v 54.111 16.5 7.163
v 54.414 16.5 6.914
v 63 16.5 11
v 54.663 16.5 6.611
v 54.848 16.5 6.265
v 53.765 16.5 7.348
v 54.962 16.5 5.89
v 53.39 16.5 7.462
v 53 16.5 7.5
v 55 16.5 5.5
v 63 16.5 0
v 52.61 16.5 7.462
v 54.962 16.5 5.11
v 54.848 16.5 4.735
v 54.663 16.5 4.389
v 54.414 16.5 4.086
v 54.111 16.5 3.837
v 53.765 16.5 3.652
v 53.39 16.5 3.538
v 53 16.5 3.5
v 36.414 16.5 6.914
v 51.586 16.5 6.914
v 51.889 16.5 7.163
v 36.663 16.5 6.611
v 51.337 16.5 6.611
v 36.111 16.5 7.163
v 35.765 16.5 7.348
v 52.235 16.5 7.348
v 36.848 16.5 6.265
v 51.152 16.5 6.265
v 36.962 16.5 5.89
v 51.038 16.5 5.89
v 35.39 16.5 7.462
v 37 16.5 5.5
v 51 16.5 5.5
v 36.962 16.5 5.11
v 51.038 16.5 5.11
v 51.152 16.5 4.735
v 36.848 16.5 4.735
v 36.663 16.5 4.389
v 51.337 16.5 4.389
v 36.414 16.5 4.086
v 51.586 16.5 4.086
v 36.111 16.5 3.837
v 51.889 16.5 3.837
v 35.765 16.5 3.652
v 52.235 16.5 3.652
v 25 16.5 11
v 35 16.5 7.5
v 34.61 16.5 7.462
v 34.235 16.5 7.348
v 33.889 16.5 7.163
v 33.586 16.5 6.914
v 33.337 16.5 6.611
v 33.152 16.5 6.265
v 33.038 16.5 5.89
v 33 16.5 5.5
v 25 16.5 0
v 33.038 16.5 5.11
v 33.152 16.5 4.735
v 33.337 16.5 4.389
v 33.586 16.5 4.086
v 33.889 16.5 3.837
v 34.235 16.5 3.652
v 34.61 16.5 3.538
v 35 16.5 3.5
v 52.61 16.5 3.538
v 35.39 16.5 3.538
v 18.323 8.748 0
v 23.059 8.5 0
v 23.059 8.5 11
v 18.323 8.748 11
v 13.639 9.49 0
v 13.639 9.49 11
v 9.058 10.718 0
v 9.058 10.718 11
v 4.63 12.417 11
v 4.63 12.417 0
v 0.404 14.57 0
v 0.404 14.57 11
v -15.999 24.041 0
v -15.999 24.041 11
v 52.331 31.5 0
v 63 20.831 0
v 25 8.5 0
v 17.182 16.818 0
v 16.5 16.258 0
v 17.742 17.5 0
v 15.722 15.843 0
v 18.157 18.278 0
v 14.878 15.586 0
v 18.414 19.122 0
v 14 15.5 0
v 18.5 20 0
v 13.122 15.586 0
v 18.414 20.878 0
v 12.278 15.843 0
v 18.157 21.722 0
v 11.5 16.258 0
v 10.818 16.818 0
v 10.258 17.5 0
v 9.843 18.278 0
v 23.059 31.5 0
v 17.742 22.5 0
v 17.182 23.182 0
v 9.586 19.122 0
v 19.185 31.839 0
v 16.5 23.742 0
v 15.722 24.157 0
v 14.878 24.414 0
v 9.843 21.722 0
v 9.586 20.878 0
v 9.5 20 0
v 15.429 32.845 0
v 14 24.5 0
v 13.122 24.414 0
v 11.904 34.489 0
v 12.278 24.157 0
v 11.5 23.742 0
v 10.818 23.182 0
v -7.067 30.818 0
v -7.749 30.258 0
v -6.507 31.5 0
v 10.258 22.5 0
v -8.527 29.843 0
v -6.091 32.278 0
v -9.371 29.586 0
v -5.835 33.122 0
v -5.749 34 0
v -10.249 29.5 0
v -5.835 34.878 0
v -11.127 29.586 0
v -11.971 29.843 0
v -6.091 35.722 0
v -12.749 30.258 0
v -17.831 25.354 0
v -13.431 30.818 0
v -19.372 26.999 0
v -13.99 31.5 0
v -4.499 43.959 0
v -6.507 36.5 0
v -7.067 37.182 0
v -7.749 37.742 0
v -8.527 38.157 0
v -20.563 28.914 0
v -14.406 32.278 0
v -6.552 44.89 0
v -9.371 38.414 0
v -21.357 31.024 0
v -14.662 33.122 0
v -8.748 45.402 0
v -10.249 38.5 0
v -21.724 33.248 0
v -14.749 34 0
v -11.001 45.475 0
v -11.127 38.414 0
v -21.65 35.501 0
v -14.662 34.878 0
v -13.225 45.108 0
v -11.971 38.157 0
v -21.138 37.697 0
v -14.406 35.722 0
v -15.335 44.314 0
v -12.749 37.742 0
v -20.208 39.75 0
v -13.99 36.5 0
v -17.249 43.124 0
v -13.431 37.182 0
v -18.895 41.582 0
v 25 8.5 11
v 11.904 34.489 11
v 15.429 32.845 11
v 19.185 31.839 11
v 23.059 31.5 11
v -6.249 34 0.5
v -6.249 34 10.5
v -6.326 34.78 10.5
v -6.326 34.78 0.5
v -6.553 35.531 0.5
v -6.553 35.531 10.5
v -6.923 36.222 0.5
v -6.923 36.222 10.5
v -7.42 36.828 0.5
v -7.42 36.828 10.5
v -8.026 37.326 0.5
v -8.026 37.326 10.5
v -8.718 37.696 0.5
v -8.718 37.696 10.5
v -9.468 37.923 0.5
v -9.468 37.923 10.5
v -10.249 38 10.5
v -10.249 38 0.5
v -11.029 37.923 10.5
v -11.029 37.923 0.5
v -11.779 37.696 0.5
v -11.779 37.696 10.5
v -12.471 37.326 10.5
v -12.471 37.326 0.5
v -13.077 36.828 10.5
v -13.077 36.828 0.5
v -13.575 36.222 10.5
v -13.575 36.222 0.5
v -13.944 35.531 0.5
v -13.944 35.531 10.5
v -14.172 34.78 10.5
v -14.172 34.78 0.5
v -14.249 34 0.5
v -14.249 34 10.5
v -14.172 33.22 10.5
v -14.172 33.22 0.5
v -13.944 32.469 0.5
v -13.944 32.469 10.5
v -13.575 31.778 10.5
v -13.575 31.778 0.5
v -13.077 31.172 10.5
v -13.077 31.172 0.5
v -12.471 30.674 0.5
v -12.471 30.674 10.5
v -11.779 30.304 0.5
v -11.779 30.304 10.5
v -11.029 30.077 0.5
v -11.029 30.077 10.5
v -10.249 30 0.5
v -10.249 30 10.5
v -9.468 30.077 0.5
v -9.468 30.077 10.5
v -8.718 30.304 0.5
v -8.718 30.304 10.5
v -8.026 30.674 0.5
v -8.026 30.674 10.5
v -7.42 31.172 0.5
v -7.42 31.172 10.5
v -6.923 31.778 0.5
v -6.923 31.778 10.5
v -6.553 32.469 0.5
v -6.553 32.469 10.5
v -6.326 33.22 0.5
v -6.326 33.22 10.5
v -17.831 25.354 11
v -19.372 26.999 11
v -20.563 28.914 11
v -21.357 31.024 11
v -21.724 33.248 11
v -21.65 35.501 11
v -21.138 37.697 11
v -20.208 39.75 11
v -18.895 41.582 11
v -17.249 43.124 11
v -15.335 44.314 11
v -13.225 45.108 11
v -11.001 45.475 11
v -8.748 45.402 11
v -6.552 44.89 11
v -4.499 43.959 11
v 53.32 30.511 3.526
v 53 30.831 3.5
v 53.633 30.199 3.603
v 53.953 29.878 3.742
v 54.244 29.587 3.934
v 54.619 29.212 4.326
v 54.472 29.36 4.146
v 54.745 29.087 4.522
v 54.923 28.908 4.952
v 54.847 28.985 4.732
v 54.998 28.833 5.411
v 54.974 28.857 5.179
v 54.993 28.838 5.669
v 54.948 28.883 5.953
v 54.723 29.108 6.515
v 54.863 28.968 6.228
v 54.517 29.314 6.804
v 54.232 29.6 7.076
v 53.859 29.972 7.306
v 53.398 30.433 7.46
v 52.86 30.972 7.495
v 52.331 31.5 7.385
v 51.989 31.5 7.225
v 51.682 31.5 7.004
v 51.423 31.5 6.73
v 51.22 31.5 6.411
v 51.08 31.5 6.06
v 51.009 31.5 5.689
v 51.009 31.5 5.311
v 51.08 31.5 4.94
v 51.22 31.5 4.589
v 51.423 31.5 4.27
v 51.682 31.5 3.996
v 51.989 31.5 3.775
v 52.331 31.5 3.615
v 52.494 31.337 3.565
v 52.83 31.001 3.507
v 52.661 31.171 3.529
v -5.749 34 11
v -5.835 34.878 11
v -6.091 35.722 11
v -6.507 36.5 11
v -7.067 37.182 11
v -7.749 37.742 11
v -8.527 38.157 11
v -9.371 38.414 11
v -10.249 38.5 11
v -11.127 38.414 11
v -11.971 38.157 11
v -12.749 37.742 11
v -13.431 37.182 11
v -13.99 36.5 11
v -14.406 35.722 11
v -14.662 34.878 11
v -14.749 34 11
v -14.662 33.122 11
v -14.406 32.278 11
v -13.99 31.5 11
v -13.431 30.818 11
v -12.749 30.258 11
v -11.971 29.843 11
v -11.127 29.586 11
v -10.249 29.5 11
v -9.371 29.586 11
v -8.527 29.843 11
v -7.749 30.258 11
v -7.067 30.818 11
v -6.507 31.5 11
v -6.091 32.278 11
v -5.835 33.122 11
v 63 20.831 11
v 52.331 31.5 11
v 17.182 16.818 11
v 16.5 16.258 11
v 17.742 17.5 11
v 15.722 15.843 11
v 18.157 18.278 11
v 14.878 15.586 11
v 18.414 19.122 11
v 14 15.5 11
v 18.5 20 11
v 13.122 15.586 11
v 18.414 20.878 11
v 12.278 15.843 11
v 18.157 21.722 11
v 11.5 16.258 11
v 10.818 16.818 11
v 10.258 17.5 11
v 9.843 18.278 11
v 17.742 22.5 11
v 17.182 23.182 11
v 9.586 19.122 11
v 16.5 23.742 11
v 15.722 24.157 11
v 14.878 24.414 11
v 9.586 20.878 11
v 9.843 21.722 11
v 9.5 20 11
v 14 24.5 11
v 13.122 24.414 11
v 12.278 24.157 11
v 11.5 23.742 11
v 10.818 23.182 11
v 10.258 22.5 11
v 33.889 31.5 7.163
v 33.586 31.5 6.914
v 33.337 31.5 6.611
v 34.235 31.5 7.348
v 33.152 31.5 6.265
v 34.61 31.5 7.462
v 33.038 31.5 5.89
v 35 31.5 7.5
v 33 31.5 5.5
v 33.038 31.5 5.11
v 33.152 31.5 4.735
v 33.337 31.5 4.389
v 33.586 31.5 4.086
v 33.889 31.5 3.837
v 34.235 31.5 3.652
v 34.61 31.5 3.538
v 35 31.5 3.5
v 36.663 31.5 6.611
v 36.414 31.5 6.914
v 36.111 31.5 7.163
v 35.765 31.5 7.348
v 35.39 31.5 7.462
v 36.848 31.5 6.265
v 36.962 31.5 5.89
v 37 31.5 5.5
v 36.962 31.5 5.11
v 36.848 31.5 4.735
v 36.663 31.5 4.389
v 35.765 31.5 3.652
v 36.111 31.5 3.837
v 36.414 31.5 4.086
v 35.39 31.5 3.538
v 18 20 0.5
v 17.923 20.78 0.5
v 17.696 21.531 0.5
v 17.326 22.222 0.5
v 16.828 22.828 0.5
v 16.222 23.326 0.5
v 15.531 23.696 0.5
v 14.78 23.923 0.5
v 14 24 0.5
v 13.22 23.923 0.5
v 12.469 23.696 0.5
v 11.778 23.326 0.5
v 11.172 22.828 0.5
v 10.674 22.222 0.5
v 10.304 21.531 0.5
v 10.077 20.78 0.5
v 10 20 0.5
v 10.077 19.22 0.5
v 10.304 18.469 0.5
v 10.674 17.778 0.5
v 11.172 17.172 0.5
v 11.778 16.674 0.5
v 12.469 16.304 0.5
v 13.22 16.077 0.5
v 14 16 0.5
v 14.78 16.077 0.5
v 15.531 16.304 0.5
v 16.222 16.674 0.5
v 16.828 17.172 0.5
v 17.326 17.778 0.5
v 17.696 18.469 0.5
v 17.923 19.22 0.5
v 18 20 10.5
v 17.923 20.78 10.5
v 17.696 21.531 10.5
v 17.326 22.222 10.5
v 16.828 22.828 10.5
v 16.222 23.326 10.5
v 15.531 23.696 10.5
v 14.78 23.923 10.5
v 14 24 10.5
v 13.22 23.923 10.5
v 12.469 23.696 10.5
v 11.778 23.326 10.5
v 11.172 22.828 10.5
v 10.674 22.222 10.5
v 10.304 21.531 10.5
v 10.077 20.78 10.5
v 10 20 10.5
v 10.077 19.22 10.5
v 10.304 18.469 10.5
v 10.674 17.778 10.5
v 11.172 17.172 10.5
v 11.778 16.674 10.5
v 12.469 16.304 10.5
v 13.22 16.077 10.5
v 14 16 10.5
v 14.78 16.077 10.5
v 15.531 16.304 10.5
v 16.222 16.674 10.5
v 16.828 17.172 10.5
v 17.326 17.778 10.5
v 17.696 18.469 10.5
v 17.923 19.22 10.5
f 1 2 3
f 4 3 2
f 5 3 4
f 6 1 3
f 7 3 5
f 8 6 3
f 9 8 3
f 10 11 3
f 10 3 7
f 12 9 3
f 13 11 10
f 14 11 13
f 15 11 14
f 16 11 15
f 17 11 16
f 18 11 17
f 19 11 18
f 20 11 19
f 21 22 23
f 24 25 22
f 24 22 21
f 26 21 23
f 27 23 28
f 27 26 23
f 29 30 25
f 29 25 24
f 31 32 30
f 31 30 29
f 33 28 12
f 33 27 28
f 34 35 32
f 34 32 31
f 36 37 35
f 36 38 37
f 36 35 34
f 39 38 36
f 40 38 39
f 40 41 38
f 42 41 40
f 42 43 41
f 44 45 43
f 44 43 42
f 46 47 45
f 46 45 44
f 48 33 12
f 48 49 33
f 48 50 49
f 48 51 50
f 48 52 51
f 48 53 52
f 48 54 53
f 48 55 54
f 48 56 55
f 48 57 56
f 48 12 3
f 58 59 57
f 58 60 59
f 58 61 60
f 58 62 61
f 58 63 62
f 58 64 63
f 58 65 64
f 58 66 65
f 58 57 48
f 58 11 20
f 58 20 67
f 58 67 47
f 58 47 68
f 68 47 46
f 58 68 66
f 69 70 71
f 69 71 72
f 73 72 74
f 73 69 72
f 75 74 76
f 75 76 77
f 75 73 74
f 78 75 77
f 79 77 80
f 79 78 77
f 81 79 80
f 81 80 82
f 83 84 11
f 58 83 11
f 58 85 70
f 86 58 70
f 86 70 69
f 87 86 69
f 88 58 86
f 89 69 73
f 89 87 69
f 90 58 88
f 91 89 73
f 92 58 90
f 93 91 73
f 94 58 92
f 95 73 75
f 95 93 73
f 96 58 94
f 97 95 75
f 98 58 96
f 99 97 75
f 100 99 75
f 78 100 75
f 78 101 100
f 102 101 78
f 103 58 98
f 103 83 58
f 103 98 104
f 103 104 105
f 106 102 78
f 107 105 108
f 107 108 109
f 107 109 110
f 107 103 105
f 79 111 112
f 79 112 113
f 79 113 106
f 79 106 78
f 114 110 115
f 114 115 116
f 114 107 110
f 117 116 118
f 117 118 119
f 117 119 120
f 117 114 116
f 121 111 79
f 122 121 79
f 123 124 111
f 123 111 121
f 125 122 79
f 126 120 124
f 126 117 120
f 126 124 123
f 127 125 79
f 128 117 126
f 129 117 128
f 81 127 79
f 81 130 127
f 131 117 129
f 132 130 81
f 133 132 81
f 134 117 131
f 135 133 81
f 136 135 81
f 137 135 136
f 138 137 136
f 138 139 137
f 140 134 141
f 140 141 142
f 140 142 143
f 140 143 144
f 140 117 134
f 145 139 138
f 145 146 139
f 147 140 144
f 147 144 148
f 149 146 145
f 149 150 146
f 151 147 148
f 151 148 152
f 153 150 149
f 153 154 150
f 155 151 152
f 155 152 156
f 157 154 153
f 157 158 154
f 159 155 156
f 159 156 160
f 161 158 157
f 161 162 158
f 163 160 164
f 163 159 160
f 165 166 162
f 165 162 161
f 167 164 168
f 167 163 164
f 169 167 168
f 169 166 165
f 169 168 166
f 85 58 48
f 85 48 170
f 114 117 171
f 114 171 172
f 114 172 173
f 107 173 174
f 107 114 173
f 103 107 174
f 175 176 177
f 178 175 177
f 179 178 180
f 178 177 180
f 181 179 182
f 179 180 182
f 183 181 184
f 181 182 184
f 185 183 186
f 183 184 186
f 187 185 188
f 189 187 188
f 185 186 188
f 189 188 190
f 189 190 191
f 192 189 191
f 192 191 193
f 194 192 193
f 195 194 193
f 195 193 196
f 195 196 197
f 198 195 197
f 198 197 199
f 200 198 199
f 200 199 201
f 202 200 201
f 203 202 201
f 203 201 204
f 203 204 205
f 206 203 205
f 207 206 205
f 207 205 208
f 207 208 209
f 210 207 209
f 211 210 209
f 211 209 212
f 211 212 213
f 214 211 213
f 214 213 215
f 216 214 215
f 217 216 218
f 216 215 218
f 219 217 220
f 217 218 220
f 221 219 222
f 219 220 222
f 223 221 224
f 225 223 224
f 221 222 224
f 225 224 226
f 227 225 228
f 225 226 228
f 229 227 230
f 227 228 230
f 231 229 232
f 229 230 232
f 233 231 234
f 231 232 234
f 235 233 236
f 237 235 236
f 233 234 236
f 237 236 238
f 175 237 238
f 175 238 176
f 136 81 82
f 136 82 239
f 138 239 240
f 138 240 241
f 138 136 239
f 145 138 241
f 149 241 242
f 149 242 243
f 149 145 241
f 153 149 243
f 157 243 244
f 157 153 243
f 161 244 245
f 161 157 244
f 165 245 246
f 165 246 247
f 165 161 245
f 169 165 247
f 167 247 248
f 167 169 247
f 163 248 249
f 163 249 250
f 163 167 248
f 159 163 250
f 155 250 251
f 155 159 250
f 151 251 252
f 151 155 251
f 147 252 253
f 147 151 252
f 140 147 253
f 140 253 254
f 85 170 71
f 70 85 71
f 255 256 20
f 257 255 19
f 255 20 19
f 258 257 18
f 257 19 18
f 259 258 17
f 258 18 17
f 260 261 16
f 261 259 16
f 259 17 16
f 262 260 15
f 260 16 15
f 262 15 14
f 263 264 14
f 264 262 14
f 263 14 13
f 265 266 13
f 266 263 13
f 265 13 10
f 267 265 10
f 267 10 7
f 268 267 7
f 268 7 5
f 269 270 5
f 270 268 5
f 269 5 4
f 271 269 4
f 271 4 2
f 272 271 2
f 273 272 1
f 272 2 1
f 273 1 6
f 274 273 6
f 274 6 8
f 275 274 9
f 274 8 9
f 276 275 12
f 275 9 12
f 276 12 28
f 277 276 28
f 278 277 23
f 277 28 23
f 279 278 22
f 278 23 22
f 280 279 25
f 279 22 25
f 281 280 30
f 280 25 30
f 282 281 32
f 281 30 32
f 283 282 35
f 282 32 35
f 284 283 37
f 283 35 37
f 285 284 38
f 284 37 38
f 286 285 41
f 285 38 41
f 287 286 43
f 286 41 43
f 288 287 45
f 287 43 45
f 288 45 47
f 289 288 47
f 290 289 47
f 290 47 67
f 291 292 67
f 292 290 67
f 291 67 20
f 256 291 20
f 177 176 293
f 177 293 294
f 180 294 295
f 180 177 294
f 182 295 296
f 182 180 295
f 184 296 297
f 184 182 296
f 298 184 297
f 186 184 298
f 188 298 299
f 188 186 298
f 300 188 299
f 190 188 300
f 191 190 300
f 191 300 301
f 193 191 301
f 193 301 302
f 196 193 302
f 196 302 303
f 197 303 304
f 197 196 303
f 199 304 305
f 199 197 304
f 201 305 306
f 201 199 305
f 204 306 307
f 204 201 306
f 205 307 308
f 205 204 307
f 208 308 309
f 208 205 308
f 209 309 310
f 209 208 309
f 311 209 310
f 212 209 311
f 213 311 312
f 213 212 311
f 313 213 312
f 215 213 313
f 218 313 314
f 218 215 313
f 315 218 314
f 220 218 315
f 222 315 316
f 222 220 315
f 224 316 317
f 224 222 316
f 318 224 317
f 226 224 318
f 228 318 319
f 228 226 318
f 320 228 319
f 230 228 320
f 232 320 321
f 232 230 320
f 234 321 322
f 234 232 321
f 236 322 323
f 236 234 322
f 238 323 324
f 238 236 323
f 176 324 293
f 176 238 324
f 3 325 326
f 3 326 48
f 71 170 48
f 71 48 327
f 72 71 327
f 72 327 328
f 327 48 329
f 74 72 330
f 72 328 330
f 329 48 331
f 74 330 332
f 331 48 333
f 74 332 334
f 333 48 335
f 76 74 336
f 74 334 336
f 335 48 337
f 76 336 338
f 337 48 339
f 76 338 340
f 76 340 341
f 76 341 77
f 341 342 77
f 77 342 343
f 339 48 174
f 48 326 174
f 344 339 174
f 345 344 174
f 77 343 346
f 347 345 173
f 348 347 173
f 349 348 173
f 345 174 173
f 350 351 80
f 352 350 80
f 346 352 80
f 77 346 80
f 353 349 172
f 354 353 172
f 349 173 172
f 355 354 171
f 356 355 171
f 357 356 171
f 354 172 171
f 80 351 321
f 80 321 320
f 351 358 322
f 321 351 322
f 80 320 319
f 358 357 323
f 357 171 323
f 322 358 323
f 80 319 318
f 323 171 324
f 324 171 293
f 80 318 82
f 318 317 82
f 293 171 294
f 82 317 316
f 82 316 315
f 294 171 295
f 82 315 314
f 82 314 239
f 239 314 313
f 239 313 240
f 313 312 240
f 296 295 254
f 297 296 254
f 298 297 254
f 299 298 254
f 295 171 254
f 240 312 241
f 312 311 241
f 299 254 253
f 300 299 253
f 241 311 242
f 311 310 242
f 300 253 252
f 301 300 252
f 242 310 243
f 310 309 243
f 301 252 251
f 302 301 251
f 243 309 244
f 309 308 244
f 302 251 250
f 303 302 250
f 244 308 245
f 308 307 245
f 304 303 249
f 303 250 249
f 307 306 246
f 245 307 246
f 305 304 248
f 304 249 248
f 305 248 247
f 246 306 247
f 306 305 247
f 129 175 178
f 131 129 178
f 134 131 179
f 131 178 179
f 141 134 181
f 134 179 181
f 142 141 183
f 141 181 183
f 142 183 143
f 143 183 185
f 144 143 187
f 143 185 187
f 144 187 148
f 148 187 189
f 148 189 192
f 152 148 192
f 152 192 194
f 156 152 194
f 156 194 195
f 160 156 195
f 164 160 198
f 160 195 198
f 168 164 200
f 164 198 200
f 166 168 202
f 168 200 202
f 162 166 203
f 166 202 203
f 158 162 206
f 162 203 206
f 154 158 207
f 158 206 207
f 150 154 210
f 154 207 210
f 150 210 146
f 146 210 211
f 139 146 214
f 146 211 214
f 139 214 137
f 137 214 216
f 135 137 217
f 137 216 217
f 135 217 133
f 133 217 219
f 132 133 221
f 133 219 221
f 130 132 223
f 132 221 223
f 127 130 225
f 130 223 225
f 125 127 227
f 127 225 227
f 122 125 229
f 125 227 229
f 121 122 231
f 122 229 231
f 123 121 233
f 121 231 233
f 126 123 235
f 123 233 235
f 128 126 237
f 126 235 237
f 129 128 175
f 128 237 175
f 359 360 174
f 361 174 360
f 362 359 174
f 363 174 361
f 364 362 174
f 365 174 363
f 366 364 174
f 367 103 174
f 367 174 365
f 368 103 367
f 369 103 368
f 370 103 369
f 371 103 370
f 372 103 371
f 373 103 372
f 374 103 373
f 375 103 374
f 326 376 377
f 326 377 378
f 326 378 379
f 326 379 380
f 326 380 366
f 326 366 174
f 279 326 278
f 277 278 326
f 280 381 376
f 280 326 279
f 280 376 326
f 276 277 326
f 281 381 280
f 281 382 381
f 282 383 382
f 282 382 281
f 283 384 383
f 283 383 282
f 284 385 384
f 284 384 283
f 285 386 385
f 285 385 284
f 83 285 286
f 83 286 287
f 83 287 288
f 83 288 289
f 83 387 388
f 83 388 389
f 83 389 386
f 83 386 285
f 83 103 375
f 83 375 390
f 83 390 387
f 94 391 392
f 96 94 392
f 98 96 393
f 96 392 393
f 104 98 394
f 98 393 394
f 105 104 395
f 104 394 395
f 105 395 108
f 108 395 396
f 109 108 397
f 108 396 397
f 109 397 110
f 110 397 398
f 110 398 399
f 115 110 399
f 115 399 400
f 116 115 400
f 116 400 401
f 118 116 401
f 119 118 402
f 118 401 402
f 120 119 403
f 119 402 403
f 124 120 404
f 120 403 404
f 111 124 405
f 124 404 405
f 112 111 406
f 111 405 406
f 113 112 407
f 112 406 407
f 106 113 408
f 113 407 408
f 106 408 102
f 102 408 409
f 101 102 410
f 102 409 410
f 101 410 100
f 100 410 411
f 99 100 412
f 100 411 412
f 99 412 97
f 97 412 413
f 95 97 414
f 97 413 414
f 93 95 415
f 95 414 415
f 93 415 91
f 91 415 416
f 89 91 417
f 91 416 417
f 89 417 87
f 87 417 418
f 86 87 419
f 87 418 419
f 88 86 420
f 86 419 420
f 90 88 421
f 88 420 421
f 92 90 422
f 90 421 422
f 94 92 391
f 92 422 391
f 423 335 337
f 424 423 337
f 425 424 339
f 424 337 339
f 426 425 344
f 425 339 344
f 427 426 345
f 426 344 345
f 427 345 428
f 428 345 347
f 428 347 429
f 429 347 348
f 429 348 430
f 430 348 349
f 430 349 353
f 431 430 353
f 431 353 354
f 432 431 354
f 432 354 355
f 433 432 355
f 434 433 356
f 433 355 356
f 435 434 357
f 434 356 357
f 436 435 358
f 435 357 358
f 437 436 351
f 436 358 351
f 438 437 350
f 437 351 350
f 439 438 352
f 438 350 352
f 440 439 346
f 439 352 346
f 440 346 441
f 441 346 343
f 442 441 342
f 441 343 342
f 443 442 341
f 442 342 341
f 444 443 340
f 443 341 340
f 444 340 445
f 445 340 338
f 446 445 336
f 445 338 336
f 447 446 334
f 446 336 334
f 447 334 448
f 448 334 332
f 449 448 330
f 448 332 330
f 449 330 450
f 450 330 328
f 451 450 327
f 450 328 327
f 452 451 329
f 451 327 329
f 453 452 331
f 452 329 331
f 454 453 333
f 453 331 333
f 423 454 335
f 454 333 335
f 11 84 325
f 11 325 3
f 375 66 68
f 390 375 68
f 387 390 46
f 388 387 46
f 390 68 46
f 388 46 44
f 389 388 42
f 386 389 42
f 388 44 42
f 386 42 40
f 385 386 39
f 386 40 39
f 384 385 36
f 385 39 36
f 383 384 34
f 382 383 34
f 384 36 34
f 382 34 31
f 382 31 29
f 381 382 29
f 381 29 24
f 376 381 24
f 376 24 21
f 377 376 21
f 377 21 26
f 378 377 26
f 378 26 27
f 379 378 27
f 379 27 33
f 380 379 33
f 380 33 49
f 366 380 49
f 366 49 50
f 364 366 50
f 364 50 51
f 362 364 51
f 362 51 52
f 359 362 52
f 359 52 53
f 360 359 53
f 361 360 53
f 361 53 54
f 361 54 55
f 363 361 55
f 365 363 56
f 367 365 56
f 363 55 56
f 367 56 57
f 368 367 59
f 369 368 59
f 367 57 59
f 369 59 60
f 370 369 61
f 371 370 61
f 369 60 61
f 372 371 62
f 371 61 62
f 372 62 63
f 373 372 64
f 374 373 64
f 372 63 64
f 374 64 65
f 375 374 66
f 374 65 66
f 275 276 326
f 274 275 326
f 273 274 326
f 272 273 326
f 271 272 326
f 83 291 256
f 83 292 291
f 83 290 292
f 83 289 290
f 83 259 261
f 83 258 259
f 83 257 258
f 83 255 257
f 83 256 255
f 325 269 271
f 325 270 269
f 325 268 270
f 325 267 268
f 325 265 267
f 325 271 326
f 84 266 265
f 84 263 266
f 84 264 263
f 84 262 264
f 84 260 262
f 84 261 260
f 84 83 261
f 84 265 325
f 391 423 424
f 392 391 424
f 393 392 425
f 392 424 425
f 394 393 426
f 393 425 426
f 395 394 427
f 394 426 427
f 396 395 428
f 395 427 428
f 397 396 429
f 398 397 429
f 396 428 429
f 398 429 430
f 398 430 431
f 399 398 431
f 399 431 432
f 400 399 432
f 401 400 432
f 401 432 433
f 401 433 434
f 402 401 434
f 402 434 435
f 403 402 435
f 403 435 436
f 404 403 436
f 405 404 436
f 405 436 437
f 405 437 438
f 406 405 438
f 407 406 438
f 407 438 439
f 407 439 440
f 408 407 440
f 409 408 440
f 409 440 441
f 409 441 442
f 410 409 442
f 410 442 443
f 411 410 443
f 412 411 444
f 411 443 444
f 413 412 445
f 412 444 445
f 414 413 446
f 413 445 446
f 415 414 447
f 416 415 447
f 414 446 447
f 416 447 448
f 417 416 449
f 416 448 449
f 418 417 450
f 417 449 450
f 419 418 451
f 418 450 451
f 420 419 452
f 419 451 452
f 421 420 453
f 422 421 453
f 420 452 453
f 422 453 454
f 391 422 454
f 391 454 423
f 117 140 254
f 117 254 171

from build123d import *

# Parameters (mm, degrees)
BASE_EXTRUSION_DEPTH    = 11
ESQUISSE2_R             = 4
ENL_V_MAT_EXTRU_1_DEPTH = 79.487260113
CHANFREIN1_SIZE         = 0.5
ESQUISSE3_R             = 4
ENL_V_MAT_EXTRU_3_DEPTH = 76.099025835
CHANFREIN2_SIZE         = 0.5
ESQUISSE4_R             = 2
ENL_V_MAT_EXTRU_4_DEPTH = 21.849235277


with BuildPart() as part:
    # Esquisse1 → Base-Extrusion (new body)
    with BuildSketch(Plane.XY):
        with BuildLine():
            Line((23.059250232, 31.5), (52.331191161, 31.5))
            Line((52.331191161, 31.5), (63, 20.831191161))
            Line((63, 20.831191161), (63, 16.5))
            Line((63, 16.5), (25, 16.5))
            Line((25, 16.5), (25, 8.5))
            Line((25, 8.5), (23.059250232, 8.5))
            ThreePointArc((23.059250232, 8.5), (11.332267447, 10.043886573), (0.40445916, 14.570332972))
            Line((0.40445916, 14.570332972), (-15.998711306, 24.040707856))
            ThreePointArc((-15.998711306, 24.040707856), (-20.208003449, 39.75), (-4.498711306, 43.959292144))
            Line((-4.498711306, 43.959292144), (11.90445916, 34.488917259))
            ThreePointArc((11.90445916, 34.488917259), (17.285105485, 32.260180577), (23.059250232, 31.5))
        make_face()
    extrude(amount=BASE_EXTRUSION_DEPTH)

    # Esquisse2 → Enlèv. mat.-Extru.1 (cut, through all)
    with BuildSketch(Plane.XY.offset(11)):
        with Locations((-10.248711306, 34)):
            Circle(ESQUISSE2_R)
    extrude(amount=-ENL_V_MAT_EXTRU_1_DEPTH, mode=Mode.SUBTRACT)

    # Chanfrein1
    chanfrein1_edges = [part.edges().sort_by_distance(p)[0] for p in [
        (-14.248711306, 34, 0),
        (-14.248711306, 34, 11),
    ]]
    chamfer(chanfrein1_edges, length=CHANFREIN1_SIZE)

    # Esquisse3 → Enlèv. mat.-Extru.3 (cut, through all)
    with BuildSketch(Plane(origin=(23.483322458, -13.431543362, 11), x_dir=(1, 0, 0), z_dir=(0, 0, 1))):
        with Locations((-9.483322458, 33.431543362)):
            Circle(ESQUISSE3_R)
    extrude(amount=-ENL_V_MAT_EXTRU_3_DEPTH, mode=Mode.SUBTRACT)

    # Chanfrein2
    chanfrein2_edges = [part.edges().sort_by_distance(p)[0] for p in [
        (10, 20, 0),
        (10, 20, 11),
    ]]
    chamfer(chanfrein2_edges, length=CHANFREIN2_SIZE)

    # Esquisse4 → Enlèv. mat.-Extru.4 (cut)
    with BuildSketch(Plane.XZ.offset(-16.5)):
        with Locations(Location((35, 5.5, 0), (0, 0, 270))):
            Circle(ESQUISSE4_R)
        with Locations(Location((53, 5.5, 0), (0, 0, 270))):
            Circle(ESQUISSE4_R)
    extrude(amount=-ENL_V_MAT_EXTRU_4_DEPTH, mode=Mode.SUBTRACT)


solid = part.part
